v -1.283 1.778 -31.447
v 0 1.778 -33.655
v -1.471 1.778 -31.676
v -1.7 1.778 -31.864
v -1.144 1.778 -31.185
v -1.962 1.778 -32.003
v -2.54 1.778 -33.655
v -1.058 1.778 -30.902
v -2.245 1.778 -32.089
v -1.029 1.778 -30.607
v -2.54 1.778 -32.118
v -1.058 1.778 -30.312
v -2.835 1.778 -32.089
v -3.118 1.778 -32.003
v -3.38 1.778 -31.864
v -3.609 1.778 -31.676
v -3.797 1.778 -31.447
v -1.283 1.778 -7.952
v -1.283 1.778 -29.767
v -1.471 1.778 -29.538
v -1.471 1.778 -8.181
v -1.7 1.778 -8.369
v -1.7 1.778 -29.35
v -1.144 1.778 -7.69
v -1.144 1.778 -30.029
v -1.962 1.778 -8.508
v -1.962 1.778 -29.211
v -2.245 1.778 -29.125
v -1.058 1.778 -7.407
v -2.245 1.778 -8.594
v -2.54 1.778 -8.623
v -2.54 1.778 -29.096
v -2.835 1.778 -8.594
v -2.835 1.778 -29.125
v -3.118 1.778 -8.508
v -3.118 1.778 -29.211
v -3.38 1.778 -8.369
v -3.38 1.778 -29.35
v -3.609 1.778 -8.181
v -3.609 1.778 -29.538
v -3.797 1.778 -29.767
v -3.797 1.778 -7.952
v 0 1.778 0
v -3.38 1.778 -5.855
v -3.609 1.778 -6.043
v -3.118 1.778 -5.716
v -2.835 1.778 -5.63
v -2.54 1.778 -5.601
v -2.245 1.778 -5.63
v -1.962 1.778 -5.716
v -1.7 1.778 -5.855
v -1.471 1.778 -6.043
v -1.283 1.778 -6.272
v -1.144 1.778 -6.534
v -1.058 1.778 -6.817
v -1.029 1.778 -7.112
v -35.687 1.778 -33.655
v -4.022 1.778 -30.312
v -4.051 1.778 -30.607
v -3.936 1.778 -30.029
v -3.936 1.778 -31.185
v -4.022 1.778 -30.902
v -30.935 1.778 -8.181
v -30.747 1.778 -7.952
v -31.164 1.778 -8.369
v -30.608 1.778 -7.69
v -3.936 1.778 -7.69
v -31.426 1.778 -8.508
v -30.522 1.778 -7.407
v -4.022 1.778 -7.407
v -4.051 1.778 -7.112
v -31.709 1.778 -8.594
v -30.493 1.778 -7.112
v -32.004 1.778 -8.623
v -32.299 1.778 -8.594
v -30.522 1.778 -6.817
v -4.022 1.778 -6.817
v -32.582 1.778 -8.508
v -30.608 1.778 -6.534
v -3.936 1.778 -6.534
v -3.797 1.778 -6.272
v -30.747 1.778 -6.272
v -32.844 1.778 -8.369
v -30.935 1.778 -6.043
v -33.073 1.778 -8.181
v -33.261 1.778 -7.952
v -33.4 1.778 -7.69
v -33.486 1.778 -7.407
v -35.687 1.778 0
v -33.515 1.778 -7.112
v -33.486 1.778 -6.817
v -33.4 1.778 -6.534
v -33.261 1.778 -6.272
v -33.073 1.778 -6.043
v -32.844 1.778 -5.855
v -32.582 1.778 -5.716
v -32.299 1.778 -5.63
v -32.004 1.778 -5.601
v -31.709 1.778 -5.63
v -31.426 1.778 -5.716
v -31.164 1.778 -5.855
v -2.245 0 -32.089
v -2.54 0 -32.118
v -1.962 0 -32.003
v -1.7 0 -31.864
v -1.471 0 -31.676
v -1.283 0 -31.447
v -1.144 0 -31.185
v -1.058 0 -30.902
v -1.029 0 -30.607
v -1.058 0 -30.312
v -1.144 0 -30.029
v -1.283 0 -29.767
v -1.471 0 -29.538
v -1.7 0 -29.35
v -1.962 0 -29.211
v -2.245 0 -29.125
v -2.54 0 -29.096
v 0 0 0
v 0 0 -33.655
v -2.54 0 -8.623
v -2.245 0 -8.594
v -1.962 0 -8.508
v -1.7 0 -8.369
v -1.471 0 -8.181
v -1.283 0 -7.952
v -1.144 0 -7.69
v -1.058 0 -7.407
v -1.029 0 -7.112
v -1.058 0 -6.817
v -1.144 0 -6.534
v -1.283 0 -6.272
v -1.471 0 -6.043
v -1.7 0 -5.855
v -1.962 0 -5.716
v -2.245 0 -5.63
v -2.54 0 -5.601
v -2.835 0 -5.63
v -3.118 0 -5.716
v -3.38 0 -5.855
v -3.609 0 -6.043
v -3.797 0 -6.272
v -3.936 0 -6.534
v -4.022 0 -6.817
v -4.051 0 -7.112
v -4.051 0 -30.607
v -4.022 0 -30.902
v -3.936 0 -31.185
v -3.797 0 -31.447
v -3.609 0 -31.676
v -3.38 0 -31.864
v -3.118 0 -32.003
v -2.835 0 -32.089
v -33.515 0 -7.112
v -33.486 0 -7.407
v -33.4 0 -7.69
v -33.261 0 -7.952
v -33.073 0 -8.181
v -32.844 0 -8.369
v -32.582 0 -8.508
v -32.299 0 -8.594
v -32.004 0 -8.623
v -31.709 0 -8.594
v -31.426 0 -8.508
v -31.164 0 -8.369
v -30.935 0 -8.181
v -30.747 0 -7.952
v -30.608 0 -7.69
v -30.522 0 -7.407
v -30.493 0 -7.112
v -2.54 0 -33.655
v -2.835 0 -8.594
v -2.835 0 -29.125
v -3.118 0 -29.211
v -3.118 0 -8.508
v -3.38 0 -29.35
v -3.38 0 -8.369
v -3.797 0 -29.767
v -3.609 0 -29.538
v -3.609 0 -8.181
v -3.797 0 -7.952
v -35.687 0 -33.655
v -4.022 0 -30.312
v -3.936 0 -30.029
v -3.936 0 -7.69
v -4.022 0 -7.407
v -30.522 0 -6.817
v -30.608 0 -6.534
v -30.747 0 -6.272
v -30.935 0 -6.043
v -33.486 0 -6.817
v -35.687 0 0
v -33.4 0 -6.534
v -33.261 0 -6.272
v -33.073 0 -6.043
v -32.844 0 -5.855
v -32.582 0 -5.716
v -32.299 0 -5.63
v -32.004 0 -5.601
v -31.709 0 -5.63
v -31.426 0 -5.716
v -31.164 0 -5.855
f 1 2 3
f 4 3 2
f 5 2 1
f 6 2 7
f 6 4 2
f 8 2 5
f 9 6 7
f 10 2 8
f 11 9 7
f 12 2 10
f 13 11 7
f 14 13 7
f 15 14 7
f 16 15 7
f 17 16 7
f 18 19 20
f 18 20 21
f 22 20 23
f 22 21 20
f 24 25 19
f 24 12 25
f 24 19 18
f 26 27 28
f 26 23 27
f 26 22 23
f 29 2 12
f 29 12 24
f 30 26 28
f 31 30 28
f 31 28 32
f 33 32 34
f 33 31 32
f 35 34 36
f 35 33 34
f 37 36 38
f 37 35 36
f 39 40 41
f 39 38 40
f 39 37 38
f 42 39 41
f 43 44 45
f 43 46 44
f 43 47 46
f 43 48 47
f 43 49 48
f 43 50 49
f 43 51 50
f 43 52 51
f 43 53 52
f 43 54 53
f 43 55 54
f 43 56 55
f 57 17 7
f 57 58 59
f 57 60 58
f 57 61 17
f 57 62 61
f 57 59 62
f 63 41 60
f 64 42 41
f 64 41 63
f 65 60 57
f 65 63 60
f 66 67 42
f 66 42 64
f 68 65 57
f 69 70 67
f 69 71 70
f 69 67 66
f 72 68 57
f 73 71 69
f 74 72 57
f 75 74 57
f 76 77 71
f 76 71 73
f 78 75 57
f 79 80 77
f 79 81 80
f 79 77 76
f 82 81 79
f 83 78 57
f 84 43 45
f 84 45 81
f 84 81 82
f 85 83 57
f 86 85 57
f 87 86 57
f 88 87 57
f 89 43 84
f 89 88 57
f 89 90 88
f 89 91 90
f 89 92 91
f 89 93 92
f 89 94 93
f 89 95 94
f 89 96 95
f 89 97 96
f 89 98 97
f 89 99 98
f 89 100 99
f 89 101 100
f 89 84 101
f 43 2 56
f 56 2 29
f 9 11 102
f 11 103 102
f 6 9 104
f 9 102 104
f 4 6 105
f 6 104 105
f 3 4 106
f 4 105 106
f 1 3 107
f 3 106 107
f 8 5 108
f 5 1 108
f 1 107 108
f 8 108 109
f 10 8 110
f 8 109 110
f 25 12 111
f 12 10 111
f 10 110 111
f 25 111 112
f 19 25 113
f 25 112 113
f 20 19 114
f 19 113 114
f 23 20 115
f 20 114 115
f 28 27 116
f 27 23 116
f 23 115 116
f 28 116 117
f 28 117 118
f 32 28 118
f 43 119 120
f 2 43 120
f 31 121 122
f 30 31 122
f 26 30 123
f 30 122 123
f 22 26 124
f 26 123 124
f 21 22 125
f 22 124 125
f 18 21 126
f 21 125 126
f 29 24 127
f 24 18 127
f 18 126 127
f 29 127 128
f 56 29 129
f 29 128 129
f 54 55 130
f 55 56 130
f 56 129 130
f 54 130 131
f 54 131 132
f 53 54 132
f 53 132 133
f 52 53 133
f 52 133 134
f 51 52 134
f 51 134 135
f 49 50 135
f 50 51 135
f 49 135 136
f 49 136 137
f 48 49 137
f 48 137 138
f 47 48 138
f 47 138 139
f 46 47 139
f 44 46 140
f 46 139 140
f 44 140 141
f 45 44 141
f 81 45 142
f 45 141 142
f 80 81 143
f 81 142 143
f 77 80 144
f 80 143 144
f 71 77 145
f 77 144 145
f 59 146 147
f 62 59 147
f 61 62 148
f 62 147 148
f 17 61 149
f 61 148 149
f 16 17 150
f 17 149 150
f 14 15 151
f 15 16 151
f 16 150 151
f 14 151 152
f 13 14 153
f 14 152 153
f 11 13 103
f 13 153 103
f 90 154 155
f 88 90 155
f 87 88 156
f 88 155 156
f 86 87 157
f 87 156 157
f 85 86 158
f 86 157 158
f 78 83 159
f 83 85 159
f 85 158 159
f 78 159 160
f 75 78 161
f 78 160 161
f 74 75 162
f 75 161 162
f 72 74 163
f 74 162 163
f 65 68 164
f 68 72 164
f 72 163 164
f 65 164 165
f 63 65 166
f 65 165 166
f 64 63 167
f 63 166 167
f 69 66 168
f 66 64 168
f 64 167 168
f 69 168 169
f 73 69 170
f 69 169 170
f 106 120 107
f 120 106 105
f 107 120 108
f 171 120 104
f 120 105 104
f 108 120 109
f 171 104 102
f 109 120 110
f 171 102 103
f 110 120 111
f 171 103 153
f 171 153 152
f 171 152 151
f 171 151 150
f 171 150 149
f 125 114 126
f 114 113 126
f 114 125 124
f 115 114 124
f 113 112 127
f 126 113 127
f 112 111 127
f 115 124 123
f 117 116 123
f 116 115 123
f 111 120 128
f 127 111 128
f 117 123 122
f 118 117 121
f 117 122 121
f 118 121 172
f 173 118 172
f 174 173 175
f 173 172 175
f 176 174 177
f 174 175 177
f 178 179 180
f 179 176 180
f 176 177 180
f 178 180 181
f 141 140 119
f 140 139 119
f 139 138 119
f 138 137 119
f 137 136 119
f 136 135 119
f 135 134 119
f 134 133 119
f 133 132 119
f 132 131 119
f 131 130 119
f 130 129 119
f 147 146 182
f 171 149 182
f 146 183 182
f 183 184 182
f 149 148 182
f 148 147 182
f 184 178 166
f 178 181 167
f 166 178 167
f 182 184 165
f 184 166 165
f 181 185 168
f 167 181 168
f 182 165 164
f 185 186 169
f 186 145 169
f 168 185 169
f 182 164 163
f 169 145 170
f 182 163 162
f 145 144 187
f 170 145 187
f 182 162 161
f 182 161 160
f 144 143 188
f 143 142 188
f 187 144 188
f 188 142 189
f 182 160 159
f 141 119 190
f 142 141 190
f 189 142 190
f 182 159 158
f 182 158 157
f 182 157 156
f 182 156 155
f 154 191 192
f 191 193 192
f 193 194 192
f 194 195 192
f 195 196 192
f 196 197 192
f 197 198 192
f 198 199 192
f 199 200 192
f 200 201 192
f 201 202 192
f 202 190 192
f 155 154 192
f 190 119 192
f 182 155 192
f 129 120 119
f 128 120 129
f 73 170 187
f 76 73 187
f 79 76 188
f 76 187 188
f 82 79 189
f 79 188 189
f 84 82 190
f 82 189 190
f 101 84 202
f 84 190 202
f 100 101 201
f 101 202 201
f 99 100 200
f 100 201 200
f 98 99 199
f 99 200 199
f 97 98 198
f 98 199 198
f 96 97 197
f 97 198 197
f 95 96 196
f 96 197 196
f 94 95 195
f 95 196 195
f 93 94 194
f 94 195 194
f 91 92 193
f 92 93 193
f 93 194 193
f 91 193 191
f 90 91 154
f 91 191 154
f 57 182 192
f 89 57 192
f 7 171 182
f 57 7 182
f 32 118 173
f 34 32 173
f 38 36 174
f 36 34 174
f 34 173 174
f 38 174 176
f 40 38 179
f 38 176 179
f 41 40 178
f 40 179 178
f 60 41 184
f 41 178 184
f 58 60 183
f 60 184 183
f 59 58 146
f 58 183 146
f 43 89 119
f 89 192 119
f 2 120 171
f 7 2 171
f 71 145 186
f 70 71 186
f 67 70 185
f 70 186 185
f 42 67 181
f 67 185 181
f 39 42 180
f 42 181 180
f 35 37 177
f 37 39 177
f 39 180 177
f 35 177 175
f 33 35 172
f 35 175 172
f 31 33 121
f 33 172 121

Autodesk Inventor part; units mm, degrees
ref_plane "YZ Plane" through (0, 0, 0) normal (1, 0, 0) x (0, 1, 0)
ref_plane "XZ Plane" through (0, 0, 0) normal (0, 1, 0) x (-1, 0, 0)
ref_plane "XY Plane" through (0, 0, 0) normal (0, 0, 1) x (1, 0, 0)
sketch "Sketch1" plane through (0, 0, 0) normal (0, 1, 0) x (-1, 0, 0)
  line L0 (0, 0) -> (0, -33.655)
  line L1 (0, -33.655) -> (35.687, -33.655)
  line L2 (35.687, -33.655) -> (35.687, 0)
  line L3 (35.687, 0) -> (0, 0)
  line L4 (0, -33.655) -> (2.54, -33.655)
  line L5 (2.54, -33.655) -> (2.54, -30.607)
  circle A0 centre (2.54, -30.607) radius 1.5113
  line L6 (2.54, -30.607) -> (2.54, -7.112)
  circle A1 centre (2.54, -7.112) radius 1.5113
  line L7 (2.54, -7.112) -> (32.004, -7.112)
  circle A2 centre (32.004, -7.112) radius 1.5113
  dimension "d15" = 33.655
  dimension "d16" = 35.687
  dimension "d17" = 2.54
  dimension "d18" = 3.048
  dimension "d19" = 3.0226
  dimension "d20" = 23.495
  dimension "d21" = 29.464
  dimension "d22" = 3.0226
extrude "Extrusion2" add sketch "Sketch1" along normal blind 1.778
properties part number "PCB_model_2"
